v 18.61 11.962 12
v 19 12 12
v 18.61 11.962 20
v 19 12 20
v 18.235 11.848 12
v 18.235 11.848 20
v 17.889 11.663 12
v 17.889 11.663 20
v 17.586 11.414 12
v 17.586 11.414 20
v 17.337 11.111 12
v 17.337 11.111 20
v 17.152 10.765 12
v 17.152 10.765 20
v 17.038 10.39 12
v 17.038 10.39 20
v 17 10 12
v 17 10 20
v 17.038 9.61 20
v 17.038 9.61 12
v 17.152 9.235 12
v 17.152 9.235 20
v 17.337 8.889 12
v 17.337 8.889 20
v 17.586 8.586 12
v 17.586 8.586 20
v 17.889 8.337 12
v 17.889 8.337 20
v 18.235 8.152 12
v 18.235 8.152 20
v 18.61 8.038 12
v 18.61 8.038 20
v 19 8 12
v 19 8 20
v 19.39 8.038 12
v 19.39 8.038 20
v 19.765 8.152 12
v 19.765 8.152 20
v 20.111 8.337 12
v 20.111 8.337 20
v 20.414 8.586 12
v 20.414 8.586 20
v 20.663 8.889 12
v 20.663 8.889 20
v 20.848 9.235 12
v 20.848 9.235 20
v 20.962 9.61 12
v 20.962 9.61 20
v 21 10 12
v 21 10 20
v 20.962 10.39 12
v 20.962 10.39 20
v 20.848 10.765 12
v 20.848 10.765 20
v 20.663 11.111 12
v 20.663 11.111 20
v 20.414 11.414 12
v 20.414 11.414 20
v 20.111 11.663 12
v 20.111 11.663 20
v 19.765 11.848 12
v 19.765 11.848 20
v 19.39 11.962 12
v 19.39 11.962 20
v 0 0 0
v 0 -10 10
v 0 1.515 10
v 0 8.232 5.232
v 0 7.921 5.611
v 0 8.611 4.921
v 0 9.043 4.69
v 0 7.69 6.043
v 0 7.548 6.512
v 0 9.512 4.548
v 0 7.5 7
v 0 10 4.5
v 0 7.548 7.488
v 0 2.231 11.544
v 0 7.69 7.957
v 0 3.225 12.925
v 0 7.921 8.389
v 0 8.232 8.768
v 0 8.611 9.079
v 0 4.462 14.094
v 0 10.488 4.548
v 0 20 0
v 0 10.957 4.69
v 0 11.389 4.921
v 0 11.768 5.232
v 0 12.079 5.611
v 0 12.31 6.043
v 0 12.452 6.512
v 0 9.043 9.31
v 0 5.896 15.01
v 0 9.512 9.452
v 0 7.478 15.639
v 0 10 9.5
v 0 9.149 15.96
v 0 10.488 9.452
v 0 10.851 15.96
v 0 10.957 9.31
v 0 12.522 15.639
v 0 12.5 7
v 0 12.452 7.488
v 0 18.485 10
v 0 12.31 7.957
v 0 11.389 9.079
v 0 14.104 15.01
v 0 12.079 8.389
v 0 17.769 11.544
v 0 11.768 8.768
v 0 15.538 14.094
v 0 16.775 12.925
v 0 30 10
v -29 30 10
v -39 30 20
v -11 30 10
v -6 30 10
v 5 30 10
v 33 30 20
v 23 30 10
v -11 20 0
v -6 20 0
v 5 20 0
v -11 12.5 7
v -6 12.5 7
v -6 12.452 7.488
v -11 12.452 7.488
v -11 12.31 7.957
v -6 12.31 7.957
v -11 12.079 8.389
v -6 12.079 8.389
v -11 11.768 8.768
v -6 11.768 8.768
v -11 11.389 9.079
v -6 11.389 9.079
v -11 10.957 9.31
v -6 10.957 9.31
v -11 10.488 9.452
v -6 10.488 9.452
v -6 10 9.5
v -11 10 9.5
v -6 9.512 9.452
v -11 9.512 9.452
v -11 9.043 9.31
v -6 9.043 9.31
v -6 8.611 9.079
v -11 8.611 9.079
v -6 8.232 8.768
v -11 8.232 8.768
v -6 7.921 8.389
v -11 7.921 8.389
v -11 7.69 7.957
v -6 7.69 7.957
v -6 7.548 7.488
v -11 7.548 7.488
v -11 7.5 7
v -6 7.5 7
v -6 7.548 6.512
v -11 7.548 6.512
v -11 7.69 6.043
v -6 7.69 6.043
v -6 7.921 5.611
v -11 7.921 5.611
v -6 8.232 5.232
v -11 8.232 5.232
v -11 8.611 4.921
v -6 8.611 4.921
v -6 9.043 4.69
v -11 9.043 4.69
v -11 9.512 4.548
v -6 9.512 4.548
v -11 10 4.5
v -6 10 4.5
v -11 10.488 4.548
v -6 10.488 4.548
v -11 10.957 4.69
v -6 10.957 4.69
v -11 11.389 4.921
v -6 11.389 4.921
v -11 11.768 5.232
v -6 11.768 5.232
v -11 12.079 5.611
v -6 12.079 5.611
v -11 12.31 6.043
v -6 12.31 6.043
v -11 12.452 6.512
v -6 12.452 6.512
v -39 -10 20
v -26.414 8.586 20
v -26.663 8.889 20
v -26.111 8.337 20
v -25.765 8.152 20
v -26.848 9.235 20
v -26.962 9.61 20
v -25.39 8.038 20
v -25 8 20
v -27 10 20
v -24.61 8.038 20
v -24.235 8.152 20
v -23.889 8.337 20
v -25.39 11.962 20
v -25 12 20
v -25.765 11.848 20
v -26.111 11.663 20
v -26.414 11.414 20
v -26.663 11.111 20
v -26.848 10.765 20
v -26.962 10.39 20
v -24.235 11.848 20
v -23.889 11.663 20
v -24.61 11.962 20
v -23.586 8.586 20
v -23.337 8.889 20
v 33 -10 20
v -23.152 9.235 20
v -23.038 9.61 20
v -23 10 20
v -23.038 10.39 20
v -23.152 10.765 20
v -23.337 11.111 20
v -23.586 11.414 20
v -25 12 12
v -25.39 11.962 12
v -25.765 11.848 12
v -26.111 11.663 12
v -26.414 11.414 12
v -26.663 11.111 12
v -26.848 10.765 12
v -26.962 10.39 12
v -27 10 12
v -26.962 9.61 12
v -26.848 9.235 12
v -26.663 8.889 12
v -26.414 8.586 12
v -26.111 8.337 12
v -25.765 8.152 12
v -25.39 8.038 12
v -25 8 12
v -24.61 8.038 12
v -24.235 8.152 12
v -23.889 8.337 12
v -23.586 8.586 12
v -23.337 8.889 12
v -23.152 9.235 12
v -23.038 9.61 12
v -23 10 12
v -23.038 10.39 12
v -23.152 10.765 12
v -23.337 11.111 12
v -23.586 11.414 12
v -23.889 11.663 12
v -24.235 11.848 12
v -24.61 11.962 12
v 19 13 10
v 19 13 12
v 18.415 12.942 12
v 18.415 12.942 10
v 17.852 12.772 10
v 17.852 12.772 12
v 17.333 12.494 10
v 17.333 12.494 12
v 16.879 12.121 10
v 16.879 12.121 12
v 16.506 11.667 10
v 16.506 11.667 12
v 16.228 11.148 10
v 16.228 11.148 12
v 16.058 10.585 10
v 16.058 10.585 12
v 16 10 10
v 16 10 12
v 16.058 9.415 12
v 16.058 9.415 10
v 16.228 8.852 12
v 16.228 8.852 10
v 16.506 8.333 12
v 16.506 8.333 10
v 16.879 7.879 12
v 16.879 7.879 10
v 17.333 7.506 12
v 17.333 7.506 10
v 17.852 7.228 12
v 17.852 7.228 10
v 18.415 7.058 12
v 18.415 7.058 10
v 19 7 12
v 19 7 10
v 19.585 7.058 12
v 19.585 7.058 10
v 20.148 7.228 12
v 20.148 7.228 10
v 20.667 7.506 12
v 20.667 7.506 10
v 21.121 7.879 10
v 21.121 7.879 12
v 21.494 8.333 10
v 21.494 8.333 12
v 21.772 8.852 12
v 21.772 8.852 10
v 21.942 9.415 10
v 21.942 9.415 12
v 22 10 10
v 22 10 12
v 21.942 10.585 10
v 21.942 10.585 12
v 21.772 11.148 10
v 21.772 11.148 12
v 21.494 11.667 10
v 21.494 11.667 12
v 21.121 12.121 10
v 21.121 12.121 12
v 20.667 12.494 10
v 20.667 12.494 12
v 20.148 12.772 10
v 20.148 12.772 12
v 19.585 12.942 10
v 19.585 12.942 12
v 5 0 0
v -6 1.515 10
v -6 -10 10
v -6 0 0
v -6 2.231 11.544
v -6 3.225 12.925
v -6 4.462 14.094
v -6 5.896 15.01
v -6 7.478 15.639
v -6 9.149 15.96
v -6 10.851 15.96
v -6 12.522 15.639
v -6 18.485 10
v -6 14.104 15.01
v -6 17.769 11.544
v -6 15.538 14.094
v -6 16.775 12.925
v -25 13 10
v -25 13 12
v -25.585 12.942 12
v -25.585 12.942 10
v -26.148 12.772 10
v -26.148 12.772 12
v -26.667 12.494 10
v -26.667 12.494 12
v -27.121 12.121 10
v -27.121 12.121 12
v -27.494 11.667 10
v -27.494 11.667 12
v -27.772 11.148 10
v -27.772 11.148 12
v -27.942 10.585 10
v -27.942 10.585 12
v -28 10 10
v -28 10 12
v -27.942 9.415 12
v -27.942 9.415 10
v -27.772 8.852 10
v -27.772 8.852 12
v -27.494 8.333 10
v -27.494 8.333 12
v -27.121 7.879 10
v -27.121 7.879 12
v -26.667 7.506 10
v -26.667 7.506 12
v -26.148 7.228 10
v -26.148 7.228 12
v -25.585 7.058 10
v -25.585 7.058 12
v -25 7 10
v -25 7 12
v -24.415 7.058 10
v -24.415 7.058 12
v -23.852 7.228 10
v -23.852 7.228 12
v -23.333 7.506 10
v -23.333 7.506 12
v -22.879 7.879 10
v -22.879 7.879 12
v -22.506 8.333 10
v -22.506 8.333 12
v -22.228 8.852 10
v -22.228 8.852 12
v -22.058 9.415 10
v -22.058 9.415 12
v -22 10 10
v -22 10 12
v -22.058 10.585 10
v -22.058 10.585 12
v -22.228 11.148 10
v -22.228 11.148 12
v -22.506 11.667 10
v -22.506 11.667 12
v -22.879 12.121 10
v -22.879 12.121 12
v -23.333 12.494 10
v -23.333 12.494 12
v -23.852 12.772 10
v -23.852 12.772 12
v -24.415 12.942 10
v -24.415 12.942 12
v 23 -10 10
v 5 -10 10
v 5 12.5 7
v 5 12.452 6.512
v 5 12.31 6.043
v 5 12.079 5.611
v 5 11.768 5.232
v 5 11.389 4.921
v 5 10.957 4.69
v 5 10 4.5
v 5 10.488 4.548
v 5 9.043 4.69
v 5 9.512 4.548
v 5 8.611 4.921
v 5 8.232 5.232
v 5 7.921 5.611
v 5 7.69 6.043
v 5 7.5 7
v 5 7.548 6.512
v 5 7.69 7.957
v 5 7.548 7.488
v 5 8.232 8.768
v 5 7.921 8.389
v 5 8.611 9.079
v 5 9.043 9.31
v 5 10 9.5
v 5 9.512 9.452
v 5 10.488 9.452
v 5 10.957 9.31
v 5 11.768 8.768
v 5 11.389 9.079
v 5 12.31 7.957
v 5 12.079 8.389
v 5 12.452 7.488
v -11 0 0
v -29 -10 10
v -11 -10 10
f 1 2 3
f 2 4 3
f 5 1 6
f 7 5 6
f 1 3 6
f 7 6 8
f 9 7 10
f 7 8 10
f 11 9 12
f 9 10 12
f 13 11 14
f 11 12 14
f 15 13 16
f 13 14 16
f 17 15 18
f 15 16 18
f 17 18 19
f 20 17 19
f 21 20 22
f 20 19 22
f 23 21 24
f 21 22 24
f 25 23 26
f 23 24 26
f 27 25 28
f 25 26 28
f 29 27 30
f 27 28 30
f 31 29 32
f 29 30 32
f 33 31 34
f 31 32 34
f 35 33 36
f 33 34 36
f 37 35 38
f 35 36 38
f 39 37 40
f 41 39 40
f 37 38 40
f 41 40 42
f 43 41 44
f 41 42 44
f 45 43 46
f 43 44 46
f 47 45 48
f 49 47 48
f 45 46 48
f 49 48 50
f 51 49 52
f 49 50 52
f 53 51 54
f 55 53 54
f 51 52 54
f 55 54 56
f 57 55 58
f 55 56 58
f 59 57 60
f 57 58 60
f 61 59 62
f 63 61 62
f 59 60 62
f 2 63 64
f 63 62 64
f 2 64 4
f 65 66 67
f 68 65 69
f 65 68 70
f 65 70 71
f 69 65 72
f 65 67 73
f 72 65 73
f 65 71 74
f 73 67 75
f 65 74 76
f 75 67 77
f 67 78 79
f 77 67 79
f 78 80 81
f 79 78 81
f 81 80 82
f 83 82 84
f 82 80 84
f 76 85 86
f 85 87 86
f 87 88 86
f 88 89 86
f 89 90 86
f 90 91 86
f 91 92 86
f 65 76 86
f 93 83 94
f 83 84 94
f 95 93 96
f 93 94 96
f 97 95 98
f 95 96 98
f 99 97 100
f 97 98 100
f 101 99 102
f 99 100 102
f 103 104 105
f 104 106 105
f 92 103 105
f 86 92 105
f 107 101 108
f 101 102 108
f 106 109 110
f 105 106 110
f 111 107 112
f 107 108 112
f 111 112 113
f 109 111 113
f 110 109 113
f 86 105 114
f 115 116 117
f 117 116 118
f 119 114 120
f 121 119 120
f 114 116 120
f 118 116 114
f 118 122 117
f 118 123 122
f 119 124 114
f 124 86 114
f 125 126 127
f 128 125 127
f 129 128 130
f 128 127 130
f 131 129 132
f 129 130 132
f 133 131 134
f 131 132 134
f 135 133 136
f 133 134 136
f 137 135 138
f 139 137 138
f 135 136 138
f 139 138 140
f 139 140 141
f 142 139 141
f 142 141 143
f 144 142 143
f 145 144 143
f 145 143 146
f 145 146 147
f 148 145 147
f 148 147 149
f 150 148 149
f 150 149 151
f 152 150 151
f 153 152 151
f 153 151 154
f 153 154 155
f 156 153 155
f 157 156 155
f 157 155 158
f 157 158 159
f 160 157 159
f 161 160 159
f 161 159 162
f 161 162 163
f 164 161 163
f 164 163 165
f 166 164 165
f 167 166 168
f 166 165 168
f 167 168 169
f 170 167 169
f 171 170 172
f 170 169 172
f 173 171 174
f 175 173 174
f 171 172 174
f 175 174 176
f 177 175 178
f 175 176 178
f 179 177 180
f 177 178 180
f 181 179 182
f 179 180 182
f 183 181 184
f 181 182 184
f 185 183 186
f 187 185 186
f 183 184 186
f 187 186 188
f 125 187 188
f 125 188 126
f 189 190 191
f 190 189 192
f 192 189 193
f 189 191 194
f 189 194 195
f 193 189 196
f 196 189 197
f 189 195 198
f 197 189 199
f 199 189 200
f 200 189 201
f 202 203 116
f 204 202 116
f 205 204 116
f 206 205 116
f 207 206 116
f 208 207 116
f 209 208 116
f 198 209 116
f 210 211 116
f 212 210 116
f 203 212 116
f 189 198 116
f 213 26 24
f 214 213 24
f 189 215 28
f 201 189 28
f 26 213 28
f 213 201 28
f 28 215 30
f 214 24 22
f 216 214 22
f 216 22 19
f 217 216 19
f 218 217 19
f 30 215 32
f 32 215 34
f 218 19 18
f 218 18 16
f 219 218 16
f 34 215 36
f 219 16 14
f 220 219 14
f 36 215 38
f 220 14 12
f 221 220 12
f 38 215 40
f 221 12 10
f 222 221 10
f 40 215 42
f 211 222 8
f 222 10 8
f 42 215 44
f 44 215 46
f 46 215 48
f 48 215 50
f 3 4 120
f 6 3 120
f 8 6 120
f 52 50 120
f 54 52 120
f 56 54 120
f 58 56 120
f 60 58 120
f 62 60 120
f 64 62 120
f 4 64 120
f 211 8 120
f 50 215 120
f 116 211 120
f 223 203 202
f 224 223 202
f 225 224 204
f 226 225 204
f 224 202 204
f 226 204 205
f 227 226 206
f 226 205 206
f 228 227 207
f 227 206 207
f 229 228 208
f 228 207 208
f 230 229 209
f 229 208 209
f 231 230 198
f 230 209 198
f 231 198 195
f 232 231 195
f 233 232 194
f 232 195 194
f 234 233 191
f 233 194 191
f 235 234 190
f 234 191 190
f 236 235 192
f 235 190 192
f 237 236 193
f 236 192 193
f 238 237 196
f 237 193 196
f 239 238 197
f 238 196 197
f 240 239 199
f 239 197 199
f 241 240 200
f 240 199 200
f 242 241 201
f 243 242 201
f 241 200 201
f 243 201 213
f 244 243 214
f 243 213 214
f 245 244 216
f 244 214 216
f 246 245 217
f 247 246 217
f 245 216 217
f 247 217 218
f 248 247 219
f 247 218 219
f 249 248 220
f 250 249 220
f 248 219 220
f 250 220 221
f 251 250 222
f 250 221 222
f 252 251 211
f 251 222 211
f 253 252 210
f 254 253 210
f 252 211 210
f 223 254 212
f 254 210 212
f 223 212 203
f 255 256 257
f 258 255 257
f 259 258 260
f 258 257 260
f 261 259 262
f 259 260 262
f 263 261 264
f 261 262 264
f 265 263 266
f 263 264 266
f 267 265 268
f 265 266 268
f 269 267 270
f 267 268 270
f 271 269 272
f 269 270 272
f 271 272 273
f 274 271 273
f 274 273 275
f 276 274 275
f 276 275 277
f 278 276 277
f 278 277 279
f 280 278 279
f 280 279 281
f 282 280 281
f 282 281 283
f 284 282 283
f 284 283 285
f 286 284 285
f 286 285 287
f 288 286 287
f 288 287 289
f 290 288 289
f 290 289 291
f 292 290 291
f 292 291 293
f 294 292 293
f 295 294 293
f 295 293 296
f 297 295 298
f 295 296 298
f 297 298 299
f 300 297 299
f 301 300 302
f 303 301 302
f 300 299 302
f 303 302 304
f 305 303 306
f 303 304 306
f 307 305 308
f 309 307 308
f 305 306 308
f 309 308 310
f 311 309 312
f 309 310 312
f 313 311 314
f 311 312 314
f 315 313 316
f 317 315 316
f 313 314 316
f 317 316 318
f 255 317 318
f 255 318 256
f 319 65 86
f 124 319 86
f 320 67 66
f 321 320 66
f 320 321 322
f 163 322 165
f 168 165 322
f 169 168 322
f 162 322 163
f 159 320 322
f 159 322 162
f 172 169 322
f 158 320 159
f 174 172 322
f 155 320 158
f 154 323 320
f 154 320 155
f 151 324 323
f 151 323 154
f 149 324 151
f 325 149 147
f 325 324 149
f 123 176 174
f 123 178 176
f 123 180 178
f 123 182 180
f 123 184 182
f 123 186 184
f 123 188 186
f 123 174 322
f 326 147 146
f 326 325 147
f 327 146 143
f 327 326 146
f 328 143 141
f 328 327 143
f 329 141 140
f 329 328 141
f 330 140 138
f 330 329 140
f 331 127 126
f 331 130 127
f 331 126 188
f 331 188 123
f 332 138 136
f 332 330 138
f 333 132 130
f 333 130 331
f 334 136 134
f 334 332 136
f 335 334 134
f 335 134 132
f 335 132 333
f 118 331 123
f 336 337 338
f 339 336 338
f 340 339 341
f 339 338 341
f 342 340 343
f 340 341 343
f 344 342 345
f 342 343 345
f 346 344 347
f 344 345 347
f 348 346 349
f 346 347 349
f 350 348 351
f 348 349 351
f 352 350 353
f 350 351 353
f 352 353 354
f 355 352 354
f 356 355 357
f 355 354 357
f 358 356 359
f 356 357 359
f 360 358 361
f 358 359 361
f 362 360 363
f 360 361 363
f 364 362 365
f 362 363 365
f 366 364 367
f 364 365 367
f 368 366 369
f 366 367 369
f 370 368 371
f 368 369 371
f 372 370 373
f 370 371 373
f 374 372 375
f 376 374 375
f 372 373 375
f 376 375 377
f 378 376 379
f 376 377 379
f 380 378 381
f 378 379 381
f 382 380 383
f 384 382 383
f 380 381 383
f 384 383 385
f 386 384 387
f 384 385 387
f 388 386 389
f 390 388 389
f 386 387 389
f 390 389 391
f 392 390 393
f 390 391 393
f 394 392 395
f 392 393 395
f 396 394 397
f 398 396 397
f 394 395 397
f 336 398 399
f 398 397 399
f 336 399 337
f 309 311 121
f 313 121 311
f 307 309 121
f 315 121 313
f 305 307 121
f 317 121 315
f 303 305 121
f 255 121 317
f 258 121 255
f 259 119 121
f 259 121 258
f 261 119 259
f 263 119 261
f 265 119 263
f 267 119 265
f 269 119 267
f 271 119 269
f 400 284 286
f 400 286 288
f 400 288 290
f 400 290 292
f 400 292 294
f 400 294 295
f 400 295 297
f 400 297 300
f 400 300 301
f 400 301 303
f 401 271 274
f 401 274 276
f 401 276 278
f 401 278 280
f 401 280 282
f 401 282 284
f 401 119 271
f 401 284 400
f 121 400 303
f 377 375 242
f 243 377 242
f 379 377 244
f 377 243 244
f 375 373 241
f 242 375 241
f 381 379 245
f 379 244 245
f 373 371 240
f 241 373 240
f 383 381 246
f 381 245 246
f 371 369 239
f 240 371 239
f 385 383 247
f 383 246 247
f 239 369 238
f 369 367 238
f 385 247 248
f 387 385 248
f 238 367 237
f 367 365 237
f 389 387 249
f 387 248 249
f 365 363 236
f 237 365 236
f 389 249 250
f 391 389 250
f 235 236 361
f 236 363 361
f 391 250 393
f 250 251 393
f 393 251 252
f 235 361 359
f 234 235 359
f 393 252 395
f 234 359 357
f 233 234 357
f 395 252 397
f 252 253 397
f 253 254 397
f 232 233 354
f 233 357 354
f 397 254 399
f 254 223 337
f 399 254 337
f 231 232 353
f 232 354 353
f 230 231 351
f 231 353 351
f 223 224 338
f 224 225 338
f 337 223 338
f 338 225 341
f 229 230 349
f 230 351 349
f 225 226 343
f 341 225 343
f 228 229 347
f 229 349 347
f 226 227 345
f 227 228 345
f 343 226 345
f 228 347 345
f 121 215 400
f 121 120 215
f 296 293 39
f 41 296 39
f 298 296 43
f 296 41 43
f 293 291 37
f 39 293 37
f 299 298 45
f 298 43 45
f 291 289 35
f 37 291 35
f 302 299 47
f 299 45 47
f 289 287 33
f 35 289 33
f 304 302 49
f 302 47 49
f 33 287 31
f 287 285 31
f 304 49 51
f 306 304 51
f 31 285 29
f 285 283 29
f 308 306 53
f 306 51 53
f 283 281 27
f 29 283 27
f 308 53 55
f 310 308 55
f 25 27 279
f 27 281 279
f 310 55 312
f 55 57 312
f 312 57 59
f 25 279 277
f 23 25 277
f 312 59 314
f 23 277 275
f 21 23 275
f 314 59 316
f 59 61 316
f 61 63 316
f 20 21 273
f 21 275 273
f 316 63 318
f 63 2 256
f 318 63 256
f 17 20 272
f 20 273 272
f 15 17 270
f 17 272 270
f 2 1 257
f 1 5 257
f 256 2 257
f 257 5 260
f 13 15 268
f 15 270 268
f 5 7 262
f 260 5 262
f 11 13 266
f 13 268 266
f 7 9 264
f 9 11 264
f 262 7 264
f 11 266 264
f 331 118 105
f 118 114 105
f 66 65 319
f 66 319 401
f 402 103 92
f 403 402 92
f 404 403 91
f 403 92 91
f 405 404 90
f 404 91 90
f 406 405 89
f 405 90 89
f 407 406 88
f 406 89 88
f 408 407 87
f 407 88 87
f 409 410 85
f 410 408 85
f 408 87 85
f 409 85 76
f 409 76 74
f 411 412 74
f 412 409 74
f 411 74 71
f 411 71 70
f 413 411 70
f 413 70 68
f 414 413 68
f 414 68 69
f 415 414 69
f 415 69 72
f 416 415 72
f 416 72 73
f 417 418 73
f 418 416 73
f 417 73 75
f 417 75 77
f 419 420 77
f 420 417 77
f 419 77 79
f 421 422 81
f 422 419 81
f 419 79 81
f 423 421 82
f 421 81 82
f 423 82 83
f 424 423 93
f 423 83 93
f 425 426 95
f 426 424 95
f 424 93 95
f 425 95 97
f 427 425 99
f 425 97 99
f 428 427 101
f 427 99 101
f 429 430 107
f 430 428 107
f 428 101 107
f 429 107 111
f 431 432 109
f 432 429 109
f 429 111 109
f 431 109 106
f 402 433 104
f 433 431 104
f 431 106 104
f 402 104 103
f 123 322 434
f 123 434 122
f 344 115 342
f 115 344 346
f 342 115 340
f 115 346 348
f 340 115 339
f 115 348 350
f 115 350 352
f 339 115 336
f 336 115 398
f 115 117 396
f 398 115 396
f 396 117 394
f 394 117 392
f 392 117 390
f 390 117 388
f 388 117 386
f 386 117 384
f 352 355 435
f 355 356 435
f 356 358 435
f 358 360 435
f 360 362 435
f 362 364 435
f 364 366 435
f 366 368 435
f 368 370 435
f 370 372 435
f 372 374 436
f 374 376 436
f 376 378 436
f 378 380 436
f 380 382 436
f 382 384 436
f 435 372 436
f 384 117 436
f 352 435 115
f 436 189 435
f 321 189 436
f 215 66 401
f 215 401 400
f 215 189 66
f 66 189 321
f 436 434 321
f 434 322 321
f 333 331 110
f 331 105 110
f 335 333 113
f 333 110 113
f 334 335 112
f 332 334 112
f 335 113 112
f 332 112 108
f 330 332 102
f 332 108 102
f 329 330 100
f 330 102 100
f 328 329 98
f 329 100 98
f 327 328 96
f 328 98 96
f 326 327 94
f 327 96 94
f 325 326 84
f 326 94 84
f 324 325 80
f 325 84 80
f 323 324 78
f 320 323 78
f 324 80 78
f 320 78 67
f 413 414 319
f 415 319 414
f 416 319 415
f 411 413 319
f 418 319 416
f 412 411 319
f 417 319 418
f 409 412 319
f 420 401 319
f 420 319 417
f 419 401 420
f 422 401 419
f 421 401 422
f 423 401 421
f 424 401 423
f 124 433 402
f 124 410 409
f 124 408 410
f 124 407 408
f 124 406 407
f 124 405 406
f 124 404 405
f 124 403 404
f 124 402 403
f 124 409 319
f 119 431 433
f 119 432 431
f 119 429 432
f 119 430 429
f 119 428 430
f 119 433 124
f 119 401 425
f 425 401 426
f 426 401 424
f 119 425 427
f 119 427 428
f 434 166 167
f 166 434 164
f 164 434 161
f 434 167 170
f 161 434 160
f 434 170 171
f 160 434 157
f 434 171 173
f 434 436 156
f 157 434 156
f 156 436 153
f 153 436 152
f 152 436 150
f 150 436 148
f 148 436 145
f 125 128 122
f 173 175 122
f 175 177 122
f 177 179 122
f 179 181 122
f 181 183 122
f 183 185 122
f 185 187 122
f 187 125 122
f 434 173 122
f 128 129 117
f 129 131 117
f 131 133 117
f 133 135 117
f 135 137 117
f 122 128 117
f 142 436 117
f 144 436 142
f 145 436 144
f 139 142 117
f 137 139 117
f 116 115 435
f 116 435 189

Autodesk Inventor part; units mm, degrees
ref_plane "YZ Plane" through (0, 0, 0) normal (1, 0, 0) x (0, 1, 0)
ref_plane "XZ Plane" through (0, 0, 0) normal (0, 1, 0) x (-1, 0, 0)
ref_plane "XY Plane" through (0, 0, 0) normal (0, 0, 1) x (1, 0, 0)
sketch "Sketch2" plane through (0, 0, 0) normal (1, 0, 0) x (0, 1, 0)
  line L0 (0, 0) -> (20, 0)
  line L1 (30, 10) -> (-10, 10)
  line L2 (-10, 20) -> (-10, 10)
  line L3 (30, 20) -> (30, 10)
  line L4 (20, 0) -> (30, 10)
  line L5 (0, 0) -> (-10, 10)
  line L6 (10, 0) -> (10, 7) construction
  circle A0 centre (10, 7) radius 2.5
  circle A1 centre (10, 7) radius 8 construction
  line L7 (-10, 20) -> (30, 20)
  arc A2 (18.4853, 10) -> (1.5147, 10) centre (10, 7) ccw
  point P0 (10, 10)
  point P1 (1.9377, 11)
  dimension "d12" = 10
  dimension "d15" = 45
  dimension "d16" = 20
  dimension "d17" = 7
  dimension "d18" = 5
  dimension "d19" = 16
  dimension "square_thickness" = 10
  dimension "d22" = 9
  dimension "d55" = 11
extrude "Extrusion1" add sketch "Sketch2" along normal blind 5 contours L5 L1 L4 L0
extrude "Extrusion2" add sketch "Sketch2" against normal blind 6 contours L2 L7 L3 L1 A2
extrude "Extrusion3" add sketch "Sketch2" against normal blind 5 from surface at -6 contours L5 L1 L4 L0
extrude "Extrusion4" add sketch "Sketch2" along normal blind 23 contours L2 L7 L3 L1 A2 | A2 L1
extrude "Extrusion5" add sketch "Sketch2" against normal blind 23 from surface at -6 contours L2 L7 L3 L1 A2 | A2 L1
sketch "Sketch4" plane through (23, 30, 10) normal (0, 0, -1) x (-1, 0, 0)
  line L0 (52, -40) -> (52, 0) construction
  line L1 (52, -20) -> (0, -20) construction
  line L2 (0, 0) -> (0, -40) construction
  circle A0 centre (4, -20) radius 2
  line L3 (0, -40) -> (0, 0) construction
  circle A1 centre (48, -20) radius 2
  line L4 (52, 0) -> (52, -40) construction
  point P0 (23, -30)
  dimension "d39" = 4
  dimension "d40" = 4
  dimension "d41" = 4
  dimension "d42" = 4
hole "Hole1" at (19, 10, 10) at (-25, 10, 10) direction (0, 0, 1) diameter 4 end through all counterbore diameter 6 counterbore depth 2
sketch "Sketch5" plane through (-6, 30, 10) normal (0, 1, 0) x (1, 0, 0)
  line L0 (-23, -10) -> (-23, 0) projected
  line L1 (-23, 0) -> (-33, -10)
  line L2 (-33, -10) -> (-23, -10)
  line L3 (-23, -10) -> (29, -10) projected
  line L4 (29, -10) -> (39, -10)
  line L5 (29, 0) -> (29, -10) projected
  line L6 (39, -10) -> (29, 0)
  point P0 (6, 10)
  dimension "d51" = 45
  dimension "d52" = 45
extrude "Extrusion6" add sketch "Sketch5" against normal up to surface (40 mm away)
equation "\"d18\" = ball_bearing_ID"
equation "\"d19\" = ball_bearing_OD"
equation "\"d33\" = d29"
equation "\"d39\" = screw_size"
equation "\"d40\" = screw_size"
equation "\"d41\" = screw_size"
equation "\"d42\" = screw_size"
equation "\"d43\" = screw_size"
equation "\"ball_bearing_ID\" = 5"
equation "\"ball_bearing_OD\" = 16"
equation "\"ball_bearing_width\" = 5"
equation "\"screw_size\" = 4"
equation "\"d29\" = 23"
properties part number "3_inner_glider_carriage"
